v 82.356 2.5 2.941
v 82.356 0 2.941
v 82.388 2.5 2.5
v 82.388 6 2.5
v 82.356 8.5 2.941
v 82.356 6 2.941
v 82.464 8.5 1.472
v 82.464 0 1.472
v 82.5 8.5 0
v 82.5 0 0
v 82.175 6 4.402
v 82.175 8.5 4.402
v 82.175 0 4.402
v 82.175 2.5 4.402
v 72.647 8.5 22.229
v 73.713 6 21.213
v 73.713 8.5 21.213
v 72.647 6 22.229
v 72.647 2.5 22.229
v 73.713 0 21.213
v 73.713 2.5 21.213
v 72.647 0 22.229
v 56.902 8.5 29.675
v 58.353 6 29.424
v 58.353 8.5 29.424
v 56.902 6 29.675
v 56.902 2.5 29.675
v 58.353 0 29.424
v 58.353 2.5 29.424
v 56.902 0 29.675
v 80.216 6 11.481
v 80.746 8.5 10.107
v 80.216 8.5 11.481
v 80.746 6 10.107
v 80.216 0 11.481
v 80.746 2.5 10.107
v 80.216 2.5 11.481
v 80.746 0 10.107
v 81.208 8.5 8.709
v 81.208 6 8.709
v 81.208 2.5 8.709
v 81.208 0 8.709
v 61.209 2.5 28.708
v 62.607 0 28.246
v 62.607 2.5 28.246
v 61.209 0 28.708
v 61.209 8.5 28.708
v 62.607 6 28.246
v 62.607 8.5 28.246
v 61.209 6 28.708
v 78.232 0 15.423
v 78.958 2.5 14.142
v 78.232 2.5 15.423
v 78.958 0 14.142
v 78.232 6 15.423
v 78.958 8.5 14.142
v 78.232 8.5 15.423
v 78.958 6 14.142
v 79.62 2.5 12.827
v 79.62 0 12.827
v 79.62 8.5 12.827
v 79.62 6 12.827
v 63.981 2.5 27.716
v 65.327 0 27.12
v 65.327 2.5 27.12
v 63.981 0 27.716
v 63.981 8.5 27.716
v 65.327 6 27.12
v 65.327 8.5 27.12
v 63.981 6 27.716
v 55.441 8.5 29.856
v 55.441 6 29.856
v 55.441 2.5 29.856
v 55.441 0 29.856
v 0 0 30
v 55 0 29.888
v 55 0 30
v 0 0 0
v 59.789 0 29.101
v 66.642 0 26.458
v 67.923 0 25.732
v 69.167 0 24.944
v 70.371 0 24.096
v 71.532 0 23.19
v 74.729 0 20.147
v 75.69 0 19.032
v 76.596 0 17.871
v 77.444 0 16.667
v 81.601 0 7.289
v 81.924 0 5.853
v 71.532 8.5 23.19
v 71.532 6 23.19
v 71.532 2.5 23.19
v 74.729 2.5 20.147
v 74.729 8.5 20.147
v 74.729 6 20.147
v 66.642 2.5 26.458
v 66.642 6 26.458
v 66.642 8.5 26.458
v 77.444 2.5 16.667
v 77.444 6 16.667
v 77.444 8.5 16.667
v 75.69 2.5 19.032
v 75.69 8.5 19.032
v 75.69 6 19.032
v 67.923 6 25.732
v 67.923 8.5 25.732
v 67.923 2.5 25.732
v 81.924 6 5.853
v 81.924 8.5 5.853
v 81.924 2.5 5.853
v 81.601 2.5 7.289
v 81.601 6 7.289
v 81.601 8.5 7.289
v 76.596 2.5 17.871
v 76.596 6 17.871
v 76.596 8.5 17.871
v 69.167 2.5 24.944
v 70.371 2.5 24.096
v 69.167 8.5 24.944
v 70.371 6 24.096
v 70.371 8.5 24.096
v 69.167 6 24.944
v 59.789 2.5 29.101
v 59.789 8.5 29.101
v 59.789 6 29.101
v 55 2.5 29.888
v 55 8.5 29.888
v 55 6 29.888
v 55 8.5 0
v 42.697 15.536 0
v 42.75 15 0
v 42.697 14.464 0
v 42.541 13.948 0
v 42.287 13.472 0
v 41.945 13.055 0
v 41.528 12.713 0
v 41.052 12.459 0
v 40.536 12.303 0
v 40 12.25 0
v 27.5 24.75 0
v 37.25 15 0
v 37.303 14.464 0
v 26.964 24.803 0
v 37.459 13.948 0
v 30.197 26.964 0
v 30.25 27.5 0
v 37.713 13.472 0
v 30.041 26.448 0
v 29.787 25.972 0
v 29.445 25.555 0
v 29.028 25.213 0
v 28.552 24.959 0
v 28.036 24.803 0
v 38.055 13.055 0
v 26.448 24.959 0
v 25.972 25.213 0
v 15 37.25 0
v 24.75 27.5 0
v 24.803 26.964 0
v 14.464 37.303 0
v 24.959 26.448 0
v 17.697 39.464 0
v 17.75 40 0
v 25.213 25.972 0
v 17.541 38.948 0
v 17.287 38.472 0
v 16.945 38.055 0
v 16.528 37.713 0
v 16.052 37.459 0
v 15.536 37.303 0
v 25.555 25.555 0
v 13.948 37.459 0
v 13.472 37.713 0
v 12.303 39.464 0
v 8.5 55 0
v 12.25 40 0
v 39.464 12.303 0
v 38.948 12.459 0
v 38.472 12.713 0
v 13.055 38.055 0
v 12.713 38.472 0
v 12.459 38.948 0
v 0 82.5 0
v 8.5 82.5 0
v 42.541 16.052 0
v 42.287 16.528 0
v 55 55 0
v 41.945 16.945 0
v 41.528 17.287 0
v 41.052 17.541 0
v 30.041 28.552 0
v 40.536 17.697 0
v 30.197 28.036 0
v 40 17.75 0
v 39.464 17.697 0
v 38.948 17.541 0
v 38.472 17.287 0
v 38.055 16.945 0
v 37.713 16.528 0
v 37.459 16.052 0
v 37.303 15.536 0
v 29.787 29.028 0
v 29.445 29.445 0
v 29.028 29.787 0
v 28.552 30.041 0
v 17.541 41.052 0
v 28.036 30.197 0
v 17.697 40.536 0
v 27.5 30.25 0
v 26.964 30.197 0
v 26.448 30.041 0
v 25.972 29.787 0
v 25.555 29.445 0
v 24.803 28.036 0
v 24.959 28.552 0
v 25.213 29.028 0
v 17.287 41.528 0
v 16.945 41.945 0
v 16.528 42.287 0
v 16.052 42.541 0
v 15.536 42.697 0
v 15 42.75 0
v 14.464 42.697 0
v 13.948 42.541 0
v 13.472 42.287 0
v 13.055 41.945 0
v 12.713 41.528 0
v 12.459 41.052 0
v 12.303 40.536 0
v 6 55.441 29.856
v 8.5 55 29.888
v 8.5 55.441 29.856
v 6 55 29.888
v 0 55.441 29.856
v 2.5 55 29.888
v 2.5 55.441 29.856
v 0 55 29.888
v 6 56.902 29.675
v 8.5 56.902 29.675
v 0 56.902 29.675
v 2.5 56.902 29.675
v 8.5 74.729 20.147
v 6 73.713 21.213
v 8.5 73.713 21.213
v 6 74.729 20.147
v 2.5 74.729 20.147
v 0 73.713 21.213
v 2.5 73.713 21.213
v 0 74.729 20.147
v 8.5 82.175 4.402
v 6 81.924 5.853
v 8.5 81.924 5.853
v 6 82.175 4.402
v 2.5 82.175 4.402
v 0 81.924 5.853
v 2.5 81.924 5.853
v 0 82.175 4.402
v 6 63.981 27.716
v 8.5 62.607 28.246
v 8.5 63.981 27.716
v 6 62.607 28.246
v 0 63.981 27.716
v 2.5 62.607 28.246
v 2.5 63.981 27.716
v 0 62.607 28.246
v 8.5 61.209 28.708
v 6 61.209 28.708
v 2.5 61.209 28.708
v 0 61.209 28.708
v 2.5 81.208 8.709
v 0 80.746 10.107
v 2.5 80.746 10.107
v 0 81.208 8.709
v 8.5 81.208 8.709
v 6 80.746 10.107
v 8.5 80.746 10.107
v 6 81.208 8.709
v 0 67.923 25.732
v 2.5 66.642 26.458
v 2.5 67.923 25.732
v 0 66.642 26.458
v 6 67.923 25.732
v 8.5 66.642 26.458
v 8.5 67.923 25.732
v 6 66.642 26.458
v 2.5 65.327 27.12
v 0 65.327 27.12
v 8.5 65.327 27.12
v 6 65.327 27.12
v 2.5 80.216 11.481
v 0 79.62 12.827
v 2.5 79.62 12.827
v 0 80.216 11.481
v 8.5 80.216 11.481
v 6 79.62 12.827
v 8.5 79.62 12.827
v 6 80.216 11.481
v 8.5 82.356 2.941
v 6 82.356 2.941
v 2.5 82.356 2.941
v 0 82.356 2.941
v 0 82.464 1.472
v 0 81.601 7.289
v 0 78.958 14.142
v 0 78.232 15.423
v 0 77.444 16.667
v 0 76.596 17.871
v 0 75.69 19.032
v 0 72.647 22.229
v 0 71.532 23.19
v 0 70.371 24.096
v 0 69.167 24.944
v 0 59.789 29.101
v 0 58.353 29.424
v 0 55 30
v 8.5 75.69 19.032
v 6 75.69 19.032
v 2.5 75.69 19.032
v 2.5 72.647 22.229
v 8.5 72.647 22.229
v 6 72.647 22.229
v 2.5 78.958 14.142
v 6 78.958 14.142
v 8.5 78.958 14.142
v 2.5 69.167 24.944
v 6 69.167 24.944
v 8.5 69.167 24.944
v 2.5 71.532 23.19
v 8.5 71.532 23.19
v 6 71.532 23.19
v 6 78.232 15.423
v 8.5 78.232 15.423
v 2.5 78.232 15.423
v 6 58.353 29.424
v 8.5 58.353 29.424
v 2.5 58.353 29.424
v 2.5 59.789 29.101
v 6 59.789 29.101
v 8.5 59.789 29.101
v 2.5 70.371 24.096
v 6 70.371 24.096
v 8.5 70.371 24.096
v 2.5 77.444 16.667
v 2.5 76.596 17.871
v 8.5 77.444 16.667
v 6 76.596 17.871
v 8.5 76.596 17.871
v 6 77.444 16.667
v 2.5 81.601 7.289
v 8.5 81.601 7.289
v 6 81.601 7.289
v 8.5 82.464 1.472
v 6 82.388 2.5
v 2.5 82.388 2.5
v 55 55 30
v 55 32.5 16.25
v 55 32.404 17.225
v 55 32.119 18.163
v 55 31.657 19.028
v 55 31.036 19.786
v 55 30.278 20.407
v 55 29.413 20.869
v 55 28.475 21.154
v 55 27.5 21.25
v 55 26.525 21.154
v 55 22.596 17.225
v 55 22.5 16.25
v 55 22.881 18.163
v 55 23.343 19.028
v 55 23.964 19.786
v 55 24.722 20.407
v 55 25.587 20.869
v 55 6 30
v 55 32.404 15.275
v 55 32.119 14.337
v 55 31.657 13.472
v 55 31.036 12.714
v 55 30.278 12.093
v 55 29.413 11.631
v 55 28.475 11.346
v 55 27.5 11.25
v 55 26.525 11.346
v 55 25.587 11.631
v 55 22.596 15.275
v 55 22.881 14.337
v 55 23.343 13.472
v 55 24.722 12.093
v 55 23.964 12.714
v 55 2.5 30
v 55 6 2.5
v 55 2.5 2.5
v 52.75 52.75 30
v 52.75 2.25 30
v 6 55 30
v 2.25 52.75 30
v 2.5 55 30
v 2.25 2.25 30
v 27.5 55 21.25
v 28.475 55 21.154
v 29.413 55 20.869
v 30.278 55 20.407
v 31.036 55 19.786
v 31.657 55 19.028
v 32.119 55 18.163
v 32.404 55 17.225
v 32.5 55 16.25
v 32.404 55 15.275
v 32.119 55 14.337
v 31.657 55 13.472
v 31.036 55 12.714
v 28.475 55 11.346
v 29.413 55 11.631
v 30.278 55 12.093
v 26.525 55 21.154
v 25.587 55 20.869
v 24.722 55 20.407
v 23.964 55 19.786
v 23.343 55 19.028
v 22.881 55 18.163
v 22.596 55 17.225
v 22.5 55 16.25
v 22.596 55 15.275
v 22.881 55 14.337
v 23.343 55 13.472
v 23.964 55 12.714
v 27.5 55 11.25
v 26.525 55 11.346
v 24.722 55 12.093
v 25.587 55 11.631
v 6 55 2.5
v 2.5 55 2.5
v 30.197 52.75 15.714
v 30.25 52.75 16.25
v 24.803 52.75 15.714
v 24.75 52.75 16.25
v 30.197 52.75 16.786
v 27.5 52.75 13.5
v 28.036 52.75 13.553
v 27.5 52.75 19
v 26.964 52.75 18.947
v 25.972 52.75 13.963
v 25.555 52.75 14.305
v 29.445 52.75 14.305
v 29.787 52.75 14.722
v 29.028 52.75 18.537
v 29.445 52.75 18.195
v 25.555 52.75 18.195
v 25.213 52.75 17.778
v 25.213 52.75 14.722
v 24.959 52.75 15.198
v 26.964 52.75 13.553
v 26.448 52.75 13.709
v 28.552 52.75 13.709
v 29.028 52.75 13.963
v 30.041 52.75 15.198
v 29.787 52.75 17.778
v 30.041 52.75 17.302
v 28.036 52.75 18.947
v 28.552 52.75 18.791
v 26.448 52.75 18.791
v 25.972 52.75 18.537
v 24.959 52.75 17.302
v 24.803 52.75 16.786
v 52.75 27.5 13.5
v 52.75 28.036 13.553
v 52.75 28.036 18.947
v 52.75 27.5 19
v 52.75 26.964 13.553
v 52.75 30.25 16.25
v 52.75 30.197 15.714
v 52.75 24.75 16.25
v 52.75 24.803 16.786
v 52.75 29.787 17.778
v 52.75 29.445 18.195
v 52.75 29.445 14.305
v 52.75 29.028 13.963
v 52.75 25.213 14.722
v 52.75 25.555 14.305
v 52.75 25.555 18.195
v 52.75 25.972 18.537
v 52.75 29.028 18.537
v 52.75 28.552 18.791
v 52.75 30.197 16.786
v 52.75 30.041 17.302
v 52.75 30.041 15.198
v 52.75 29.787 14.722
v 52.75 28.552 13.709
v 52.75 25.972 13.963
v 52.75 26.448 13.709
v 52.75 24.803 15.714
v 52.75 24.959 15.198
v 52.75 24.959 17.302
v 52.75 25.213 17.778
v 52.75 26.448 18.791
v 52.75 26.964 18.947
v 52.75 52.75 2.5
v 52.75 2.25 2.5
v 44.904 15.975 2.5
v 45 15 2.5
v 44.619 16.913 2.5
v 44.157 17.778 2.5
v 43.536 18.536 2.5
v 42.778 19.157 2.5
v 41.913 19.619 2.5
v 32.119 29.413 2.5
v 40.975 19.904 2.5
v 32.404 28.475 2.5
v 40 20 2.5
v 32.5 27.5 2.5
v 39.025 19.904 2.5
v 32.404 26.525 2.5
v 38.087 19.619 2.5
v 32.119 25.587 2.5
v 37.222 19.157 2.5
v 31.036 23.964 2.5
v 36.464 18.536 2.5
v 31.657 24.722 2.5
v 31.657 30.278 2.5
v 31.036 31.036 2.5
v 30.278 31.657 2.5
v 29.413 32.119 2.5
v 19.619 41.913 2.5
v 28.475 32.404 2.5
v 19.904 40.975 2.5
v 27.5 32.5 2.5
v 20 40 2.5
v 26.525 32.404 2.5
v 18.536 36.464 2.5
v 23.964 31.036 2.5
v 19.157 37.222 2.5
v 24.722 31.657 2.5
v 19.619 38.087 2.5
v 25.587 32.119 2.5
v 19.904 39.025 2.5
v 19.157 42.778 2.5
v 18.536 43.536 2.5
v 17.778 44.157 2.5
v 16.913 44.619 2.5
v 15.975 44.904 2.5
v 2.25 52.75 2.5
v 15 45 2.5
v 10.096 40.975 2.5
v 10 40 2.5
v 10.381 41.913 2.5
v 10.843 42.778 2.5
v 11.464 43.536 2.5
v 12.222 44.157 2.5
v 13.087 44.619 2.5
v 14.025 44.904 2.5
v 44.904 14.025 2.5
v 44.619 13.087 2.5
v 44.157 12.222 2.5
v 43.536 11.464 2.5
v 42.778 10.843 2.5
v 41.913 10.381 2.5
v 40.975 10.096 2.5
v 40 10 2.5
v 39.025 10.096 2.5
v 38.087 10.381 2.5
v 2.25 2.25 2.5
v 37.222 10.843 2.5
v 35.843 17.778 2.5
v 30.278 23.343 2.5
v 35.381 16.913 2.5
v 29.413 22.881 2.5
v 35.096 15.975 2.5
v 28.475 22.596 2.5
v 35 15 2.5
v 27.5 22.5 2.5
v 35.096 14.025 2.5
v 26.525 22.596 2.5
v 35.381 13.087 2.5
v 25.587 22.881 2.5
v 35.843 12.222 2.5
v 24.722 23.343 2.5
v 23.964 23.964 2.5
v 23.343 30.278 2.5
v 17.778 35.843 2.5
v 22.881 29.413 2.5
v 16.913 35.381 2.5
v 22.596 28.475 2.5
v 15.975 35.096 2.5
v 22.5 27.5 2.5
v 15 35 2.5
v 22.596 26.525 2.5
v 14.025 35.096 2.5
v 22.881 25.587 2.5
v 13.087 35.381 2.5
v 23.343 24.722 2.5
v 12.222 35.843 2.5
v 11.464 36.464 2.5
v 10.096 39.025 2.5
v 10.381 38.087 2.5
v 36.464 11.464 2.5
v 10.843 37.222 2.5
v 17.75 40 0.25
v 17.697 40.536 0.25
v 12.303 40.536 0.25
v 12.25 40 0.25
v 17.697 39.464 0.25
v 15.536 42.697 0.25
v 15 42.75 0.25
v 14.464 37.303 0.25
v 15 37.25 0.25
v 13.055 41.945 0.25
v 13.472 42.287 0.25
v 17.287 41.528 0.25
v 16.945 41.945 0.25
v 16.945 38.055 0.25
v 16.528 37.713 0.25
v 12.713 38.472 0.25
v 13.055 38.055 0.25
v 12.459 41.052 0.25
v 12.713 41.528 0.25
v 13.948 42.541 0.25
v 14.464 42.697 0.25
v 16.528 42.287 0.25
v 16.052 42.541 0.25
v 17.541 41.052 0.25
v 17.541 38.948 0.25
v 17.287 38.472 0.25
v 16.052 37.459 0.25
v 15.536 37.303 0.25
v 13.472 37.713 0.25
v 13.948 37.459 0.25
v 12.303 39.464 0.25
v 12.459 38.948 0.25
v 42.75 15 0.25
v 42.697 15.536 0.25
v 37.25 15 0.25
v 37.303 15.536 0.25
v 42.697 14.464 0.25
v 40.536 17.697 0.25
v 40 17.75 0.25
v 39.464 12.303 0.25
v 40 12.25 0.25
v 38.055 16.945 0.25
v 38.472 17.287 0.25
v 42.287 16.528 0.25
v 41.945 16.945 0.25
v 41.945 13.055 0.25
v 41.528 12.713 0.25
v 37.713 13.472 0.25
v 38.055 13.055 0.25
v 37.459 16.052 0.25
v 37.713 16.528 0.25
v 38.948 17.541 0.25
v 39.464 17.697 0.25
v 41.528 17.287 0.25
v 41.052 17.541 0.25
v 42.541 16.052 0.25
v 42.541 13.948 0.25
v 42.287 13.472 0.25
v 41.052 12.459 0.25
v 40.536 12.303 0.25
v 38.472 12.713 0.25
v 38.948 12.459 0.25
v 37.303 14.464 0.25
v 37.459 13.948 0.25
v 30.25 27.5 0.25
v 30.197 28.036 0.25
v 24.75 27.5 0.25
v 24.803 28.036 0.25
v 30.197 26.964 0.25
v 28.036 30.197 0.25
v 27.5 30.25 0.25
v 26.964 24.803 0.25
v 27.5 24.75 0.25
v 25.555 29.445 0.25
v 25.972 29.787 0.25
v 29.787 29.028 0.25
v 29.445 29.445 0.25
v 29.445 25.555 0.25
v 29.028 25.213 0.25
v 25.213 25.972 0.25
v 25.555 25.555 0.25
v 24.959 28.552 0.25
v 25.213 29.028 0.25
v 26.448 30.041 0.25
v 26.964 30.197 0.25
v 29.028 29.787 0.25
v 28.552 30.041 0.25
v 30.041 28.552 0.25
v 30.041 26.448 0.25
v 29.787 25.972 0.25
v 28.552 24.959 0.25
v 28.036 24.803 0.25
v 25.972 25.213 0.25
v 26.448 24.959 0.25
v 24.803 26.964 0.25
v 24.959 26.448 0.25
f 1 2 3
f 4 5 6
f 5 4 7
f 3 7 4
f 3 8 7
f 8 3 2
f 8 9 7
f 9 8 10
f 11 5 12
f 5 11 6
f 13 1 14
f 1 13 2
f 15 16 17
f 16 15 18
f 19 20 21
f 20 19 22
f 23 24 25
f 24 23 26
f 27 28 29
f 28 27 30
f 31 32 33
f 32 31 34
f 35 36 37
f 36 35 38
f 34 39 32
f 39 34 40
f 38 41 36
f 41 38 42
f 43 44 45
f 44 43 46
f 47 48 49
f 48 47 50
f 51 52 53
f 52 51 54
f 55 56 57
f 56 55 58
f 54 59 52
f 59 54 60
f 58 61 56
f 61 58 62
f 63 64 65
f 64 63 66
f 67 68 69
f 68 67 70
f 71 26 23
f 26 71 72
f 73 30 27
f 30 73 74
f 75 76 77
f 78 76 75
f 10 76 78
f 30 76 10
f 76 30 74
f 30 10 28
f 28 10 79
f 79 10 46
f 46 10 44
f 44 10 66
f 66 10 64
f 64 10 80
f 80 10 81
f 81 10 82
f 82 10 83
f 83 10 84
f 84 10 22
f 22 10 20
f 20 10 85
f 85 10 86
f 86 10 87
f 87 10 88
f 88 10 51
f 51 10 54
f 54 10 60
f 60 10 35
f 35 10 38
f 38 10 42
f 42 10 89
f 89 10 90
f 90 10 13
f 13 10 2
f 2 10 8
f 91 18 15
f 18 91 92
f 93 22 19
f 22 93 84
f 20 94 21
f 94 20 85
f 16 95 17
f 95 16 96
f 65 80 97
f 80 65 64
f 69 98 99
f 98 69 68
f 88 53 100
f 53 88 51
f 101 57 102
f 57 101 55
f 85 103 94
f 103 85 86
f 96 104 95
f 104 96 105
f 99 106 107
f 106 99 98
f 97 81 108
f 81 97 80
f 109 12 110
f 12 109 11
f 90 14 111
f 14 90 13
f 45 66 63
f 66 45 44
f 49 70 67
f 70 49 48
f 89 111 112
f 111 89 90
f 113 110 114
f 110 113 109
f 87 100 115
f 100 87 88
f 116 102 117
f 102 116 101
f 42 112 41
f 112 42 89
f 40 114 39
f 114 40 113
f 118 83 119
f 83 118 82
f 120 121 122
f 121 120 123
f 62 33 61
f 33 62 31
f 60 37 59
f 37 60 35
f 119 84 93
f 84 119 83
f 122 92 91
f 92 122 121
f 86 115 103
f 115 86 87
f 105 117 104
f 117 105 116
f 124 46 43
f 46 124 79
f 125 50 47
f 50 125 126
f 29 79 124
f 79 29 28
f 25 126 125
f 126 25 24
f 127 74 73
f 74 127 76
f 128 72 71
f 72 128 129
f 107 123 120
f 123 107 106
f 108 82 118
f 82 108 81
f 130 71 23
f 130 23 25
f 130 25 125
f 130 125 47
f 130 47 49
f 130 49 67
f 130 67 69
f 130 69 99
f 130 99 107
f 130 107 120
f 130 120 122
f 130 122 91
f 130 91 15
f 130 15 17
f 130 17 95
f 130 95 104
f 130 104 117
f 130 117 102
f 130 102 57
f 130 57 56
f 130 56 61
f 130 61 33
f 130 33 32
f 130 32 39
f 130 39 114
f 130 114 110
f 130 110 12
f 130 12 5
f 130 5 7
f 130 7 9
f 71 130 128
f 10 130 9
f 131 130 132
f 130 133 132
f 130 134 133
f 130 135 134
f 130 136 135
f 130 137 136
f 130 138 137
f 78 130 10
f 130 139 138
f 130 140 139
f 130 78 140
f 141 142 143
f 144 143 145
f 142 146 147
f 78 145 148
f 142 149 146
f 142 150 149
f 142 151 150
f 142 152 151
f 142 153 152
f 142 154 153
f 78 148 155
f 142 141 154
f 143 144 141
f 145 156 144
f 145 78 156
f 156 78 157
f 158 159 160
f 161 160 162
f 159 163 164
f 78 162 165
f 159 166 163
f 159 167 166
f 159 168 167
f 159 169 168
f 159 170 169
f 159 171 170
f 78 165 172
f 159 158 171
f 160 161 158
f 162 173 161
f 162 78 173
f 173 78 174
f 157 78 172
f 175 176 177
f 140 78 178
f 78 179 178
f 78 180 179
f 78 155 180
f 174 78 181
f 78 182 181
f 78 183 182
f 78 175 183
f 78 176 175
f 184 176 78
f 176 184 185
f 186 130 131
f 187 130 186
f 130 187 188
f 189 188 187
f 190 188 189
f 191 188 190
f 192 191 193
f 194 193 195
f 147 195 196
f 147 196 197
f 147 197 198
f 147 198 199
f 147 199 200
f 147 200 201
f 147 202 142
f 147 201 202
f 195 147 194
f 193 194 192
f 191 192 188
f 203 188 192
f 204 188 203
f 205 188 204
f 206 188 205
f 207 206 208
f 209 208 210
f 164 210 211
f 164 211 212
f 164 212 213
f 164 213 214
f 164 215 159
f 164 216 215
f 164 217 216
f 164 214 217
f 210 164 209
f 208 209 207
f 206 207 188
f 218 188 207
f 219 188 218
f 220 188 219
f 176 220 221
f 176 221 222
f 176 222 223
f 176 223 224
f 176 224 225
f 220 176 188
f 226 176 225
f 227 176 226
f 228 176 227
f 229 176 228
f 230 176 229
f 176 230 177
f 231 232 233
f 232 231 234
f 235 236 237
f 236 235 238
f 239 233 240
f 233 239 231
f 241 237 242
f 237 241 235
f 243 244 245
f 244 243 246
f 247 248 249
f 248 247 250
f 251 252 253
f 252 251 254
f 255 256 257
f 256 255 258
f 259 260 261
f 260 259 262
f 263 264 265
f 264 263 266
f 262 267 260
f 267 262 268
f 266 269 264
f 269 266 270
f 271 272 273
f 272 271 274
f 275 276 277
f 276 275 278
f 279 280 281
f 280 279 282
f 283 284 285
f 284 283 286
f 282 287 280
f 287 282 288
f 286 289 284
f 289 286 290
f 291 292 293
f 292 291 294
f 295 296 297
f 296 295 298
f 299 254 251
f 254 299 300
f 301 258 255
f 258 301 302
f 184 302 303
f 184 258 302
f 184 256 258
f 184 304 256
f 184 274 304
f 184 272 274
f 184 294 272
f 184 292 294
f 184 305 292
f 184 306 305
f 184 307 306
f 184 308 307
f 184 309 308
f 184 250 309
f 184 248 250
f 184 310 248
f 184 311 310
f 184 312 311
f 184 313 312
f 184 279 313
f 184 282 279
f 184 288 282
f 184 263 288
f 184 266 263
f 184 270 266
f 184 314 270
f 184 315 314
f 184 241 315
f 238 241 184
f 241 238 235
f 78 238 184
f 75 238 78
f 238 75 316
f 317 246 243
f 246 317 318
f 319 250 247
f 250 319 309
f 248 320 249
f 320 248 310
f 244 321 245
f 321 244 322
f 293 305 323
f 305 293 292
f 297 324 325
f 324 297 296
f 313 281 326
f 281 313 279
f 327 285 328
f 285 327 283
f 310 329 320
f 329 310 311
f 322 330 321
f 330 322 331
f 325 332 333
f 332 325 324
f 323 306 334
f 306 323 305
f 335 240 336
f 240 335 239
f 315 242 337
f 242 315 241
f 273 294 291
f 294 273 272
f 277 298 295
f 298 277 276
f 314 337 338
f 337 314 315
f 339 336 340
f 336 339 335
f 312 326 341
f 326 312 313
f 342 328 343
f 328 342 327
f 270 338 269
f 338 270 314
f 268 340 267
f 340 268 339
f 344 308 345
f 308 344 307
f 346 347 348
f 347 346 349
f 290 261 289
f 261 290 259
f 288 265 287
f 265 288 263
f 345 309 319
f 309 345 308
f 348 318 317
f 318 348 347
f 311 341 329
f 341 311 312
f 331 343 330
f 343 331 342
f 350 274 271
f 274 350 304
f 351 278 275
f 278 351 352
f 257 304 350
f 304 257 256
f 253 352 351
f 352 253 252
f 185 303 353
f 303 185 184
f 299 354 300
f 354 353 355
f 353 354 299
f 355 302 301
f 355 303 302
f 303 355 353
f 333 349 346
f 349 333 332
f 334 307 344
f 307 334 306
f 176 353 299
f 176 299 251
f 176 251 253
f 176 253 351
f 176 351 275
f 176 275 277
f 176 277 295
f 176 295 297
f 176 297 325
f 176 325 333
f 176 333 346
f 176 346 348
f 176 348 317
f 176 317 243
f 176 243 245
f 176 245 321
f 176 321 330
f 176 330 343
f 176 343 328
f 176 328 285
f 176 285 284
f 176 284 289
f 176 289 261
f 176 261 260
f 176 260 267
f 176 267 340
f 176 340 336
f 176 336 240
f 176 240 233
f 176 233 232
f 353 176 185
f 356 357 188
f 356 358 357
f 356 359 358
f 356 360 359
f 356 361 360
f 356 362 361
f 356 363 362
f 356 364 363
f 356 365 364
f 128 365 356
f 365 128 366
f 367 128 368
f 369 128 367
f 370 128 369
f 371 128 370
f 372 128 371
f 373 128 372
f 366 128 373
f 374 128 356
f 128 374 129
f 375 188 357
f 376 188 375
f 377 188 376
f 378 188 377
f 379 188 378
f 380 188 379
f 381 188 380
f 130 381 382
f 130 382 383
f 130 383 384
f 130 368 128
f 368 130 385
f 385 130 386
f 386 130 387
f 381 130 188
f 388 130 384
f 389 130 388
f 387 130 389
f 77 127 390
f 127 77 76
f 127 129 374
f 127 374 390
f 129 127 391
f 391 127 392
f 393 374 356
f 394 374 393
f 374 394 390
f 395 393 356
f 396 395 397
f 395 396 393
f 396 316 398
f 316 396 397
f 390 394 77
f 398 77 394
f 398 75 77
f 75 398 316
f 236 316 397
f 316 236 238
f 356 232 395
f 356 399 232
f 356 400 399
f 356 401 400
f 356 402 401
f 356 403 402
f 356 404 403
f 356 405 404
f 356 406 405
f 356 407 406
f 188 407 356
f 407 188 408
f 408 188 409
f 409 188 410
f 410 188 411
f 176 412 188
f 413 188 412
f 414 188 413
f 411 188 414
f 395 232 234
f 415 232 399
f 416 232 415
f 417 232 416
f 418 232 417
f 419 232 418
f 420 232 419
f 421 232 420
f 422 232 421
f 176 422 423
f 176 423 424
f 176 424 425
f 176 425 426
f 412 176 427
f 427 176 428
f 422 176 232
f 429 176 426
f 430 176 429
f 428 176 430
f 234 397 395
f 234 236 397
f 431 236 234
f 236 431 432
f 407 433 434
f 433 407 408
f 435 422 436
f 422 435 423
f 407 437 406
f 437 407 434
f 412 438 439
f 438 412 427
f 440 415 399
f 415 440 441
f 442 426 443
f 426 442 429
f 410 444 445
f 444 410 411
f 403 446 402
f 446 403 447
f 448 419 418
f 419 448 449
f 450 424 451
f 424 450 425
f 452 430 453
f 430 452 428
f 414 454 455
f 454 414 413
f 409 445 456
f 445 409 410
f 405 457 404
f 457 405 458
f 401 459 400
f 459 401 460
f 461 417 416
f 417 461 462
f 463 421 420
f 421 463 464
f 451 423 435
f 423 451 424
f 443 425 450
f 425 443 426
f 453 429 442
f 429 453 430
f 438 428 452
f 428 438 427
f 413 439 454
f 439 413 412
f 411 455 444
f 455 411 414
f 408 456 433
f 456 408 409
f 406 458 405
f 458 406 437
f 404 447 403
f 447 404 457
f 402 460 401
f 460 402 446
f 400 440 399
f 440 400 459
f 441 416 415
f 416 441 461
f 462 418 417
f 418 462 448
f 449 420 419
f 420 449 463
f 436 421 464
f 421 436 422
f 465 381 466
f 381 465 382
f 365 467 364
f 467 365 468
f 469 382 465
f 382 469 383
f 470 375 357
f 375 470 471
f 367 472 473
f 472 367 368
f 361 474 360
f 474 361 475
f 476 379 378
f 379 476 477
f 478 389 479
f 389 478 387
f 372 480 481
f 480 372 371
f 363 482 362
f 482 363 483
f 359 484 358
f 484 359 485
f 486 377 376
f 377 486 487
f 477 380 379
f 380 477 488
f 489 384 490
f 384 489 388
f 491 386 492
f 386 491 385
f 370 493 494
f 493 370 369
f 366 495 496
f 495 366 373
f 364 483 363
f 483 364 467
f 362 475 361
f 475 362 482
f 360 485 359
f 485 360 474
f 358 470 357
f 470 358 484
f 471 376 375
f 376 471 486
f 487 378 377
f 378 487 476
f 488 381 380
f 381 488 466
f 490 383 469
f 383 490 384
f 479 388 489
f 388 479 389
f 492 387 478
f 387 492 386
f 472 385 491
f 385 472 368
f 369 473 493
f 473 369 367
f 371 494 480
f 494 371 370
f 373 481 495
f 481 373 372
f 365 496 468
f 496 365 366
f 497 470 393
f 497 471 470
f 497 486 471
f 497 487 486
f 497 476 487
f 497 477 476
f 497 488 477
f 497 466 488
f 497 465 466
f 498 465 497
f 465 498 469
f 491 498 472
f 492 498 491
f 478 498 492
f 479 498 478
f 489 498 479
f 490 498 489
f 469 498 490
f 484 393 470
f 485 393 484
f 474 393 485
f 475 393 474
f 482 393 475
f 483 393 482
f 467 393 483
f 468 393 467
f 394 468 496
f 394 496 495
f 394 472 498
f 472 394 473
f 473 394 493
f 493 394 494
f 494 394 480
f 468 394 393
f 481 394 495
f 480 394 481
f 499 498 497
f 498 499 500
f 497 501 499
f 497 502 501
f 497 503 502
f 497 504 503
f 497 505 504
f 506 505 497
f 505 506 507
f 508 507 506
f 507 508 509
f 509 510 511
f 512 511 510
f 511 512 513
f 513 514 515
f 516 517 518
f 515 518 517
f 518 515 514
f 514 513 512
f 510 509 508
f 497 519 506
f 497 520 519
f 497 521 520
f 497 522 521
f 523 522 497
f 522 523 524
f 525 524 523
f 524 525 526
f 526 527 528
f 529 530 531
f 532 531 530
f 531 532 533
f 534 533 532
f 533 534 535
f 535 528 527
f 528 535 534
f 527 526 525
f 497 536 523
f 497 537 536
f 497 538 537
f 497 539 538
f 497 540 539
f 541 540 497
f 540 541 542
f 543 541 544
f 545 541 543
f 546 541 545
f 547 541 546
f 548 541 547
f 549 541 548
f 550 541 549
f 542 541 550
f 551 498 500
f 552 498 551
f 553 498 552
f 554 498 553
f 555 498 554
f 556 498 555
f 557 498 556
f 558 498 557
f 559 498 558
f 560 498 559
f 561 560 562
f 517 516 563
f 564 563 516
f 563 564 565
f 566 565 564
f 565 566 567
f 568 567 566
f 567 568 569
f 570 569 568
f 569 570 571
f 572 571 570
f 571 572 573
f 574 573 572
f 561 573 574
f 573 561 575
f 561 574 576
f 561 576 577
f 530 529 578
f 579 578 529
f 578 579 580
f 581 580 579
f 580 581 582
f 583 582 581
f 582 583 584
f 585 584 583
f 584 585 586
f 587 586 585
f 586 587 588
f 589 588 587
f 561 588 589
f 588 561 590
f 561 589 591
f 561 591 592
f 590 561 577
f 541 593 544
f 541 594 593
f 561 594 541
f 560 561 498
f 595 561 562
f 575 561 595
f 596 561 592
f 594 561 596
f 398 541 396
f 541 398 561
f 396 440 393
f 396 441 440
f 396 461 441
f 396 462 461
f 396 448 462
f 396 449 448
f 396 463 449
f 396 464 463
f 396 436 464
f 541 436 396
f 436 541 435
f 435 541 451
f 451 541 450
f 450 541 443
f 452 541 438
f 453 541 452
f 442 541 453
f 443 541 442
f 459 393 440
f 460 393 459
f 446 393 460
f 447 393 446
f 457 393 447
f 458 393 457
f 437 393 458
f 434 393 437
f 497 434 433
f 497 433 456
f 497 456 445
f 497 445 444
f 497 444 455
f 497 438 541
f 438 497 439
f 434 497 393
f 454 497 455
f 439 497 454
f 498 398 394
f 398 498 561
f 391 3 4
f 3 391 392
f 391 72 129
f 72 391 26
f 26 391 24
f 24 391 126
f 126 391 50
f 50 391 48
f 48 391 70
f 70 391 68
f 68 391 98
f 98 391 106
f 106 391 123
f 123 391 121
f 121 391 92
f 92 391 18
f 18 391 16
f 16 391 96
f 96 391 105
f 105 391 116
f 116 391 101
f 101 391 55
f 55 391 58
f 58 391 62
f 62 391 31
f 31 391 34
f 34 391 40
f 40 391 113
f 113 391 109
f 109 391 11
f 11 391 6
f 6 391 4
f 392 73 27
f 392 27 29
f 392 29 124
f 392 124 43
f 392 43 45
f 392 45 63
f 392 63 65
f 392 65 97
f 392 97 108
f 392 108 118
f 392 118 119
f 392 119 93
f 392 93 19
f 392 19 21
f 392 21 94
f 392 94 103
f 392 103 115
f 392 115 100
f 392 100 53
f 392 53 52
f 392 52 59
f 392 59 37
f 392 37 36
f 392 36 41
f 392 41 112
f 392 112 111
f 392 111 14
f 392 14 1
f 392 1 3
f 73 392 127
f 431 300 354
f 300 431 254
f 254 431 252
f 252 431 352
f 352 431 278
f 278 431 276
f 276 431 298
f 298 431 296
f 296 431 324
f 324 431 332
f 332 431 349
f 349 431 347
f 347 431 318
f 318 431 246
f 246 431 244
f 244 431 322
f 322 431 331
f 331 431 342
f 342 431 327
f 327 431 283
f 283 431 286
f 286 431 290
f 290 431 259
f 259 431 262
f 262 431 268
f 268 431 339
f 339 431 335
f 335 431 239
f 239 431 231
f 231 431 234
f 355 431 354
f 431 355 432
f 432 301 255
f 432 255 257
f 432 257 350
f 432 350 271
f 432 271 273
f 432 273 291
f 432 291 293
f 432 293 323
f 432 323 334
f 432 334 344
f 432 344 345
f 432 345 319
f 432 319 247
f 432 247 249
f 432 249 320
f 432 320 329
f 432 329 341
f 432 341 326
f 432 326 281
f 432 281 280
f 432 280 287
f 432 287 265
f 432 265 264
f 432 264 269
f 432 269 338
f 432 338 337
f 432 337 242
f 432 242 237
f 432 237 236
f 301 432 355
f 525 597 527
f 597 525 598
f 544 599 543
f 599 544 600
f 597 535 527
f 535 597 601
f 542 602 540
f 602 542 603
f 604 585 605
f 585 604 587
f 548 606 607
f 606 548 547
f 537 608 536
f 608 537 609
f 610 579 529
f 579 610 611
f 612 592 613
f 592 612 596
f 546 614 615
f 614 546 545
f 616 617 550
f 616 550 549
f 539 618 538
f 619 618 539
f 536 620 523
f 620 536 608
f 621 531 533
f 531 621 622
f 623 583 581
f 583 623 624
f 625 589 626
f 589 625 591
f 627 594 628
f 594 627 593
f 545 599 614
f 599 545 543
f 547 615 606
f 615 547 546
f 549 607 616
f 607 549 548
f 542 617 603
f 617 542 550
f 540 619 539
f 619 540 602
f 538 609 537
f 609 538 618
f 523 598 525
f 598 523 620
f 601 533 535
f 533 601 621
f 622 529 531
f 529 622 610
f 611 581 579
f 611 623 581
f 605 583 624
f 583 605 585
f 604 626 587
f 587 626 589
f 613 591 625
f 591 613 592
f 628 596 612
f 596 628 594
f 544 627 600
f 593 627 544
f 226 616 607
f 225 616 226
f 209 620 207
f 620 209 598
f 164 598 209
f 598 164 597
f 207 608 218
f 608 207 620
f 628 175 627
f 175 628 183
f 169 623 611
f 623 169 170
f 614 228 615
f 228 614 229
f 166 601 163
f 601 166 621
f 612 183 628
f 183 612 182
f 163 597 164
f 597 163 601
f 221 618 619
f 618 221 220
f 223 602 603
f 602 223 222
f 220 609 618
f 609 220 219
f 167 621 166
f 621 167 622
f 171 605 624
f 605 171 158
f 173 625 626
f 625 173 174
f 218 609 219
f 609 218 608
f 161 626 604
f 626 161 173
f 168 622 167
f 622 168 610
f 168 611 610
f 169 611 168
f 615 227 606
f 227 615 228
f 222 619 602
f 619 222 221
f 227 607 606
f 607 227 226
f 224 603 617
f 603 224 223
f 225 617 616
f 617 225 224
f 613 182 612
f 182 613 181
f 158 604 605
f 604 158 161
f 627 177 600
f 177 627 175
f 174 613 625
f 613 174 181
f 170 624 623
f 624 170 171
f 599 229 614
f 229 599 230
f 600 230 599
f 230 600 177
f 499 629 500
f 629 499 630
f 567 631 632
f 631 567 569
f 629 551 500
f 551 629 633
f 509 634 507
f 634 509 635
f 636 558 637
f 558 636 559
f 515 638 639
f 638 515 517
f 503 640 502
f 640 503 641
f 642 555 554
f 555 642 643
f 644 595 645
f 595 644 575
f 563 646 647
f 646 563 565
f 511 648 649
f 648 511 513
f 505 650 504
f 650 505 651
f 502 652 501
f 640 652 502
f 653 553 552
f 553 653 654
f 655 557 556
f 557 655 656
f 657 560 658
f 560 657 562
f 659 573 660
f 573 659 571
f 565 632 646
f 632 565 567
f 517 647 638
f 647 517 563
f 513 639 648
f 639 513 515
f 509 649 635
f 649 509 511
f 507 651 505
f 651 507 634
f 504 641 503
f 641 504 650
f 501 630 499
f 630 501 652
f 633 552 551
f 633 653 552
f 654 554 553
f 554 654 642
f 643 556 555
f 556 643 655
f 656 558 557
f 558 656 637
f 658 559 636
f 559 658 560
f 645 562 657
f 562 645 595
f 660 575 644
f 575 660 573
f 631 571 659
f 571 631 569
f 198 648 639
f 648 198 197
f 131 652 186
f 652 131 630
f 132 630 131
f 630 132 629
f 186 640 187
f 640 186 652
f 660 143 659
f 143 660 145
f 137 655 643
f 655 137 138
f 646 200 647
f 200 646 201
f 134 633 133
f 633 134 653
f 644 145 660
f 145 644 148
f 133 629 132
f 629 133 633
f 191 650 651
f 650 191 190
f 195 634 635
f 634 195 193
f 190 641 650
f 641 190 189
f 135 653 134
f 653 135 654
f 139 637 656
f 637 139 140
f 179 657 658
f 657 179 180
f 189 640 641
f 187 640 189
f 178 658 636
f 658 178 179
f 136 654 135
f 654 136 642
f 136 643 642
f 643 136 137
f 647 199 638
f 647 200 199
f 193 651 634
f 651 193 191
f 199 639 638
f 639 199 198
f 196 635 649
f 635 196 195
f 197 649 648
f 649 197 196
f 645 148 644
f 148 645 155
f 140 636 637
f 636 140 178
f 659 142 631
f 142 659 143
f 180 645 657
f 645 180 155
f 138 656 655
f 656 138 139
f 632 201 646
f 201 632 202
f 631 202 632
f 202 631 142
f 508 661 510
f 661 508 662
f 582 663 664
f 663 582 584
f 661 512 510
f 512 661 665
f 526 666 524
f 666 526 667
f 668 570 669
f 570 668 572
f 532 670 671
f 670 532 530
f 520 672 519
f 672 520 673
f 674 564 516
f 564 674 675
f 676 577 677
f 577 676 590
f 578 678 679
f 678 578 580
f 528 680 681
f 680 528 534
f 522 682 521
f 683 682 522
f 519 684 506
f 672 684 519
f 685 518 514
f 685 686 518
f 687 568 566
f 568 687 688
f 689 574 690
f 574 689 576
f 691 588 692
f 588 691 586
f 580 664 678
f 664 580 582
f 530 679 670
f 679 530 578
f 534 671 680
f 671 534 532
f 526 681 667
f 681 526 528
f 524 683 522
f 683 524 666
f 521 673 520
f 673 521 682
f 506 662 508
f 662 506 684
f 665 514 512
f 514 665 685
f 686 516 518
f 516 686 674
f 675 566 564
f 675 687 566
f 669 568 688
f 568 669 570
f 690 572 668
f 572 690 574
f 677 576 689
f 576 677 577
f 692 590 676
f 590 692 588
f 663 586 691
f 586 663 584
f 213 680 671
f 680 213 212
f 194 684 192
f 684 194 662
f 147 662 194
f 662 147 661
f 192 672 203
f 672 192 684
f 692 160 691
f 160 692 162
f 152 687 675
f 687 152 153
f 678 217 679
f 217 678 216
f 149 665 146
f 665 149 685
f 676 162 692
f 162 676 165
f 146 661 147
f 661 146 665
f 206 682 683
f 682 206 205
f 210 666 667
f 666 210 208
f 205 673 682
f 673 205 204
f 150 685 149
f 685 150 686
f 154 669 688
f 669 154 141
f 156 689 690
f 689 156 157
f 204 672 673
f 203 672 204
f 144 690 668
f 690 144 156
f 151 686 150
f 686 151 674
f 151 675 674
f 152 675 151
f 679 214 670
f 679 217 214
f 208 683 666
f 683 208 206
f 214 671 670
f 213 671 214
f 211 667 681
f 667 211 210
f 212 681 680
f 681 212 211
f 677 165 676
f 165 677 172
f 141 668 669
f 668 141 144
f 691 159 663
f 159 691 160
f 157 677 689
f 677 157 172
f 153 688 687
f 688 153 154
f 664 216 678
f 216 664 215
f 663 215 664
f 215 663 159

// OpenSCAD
// file: shared.scad
// M5 CSK fitting 90deg bevel
// h - length of the drill bore including csk
// csk - diameter of the csk
// recess - recess of the csk, added above the csk
module m5csk(h=2.5, csk=10, recess=0) {
    m5bore(h=h);
    intersection() {
        translate([0, 0, -(csk/2 - h)]) cylinder(d2=csk, d1=0, h=(csk/2), $fn=32);
        cylinder(d=csk, h=h, $fn=32);
    }
    translate([0, 0, h]) cylinder(h=recess, d=csk);
}

// M5 clearance bore
// h - length of the bore
module m5bore(h=2.5) {
    cylinder(d=5.5, h=h, $fn=32);
}

module quarter_cylinder(r, h) {
    $fn=128;
    intersection() {
        cylinder(r=r, h=h);
        translate([0, 0, -0.05]) cube([r, r, h+0.1]);
    }
}

module ccube(size, center=false) {
    if(center){
        translate(-(size/2)) cube(size);
    } else {
        translate([-size.x/2, -size.y/2, 0]) cube(size);
    }
}
// file: centre_feet.scad
use <shared.scad>;

module base_centre(pillar=0){ 
    difference() {
        union() {
            translate([-55, 0, 0]) cube([110, 55, 30+pillar]);
            translate([52.75, 8.5, 0]) rotate([90, 0, 0]) quarter_cylinder(30, 8.5);
            translate([-52.75, 8.5, 0]) rotate([90, -90, 0]) quarter_cylinder(30, 8.5); 
            translate([7, 52.5, 0]) rotate([0, -90, 0]) quarter_cylinder(30, 14);
        }
        translate([2.25, 2.25, 2.5+pillar]) cube([50.5, 50.5, 27.5]);
        translate([-52.75, 2.25, 2.5+pillar]) cube([50.5, 50.5, 27.5]);
        translate([55, 2.5, 2.5]) cube([27.5, 3.5, 27.5]);
        translate([-55-27.5, 2.5, 2.5]) cube([27.5, 3.5, 27.5]);
        translate([-4.75, 55, 2.5]) cube([9.5, 27.5, 27.5]);
        translate([0, 0, 16.25+pillar]) {
            translate([27.5, 52.5, 0]) rotate([-90, 0, 0]) m5csk();
            translate([52.5, 27.5, 0]) rotate([0, 90, 0]) m5csk();
            translate([-27.5, 52.5, 0]) rotate([-90, 0, 0]) m5csk();
            translate([-52.5, 27.5, 0]) rotate([0, -90, 0]) m5csk();
        }
    }
}

module centre_foot(){ 
    difference() {
        base_centre();
        translate([15, 40, 0]) m5csk();
        translate([40, 15, 0]) m5csk();
        translate([27.5, 27.5, 0]) m5csk();
        translate([-15, 40, 0]) m5csk();
        translate([-40, 15, 0]) m5csk();
        translate([-27.5, 27.5, 0]) m5csk();
    }
}

module centre_lower_top(){ 
    difference() {
        rotate([0, 180, 0]) base_centre();
        translate([15, 40, -2.5]) m5csk();
        translate([40, 15, -2.5]) m5csk();
        translate([27.5, 27.5, 0]) rotate([180, 0, 0]) m5bore();
        translate([-15, 40, -2.5])  m5csk();
        translate([-40, 15, -2.5]) m5csk();
        translate([-27.5, 27.5, 0]) rotate([180, 0, 0]) m5bore();
    }
}

module centre_upper_top(){ 
    difference() {
        rotate([0, 180, 0]) base_centre(pillar=100);
        translate([15, 40, -102.5]) m5csk(recess=100);
        translate([40, 15, -102.5]) m5csk(recess=100);
        translate([27.5, 27.5, 0]) rotate([180, 0, 0]) m5bore(h=105);
        translate([-15, 40, -102.5]) m5csk(recess=100);
        translate([-40, 15, -102.5]) m5csk(recess=100);
        translate([-27.5, 27.5, 0]) rotate([180, 0, 0]) m5bore(h=105);
    }
}

centre_foot();
// file: outer_feet.scad
use <shared.scad>;

module base_outer(pillar=0) {
    difference() {
        union() {
            cube([55, 55, 30+pillar]);
            translate([52.5, 8.5, 0])
                rotate([90, 0, 0])
                quarter_cylinder(30, 8.5); 
            translate([8.5, 52.5, 0])
                rotate([0, -90, 0])
                quarter_cylinder(30, 8.5); 
        }
        translate([2.25, 2.25, 2.5+pillar]) cube([50.5, 50.5, 27.5]);
        translate([55, 2.5, 2.5]) cube([27.5, 3.5, 27.5]);
        translate([2.5, 55, 2.5]) cube([3.5, 27.5, 27.5]);
        translate([0, 0, 16.25+pillar]) {
            translate([27.5, 52.5, 0]) rotate([-90, 0, 0]) m5csk();
            translate([52.5, 27.5, 0]) rotate([0, 90, 0]) m5csk();
        }
    }
}

module outer_foot(){ 
    difference() {
        base_outer();
        translate([15, 40, 0]) m5csk();
        translate([40, 15, 0]) m5csk();
        translate([27.5, 27.5, 0]) m5csk();
    }
}

module outer_lower_top(){ 
    difference() {
        rotate([180, 0, 90]) base_outer();
        translate([15, 40, -2.5]) m5csk();
        translate([40, 15, -2.5]) m5csk();
        translate([27.5, 27.5, 0]) rotate([180, 0, 0]) m5bore();
    }
}

module outer_upper_top(){ 
    difference(){
        rotate([180, 0, 90]) base_outer(pillar=100);
        translate([15, 40, -102.5]) m5csk(recess=100);
        translate([40, 15, -102.5]) m5csk(recess=100);
        translate([27.5, 27.5, 0]) rotate([180, 0, 0]) m5bore(h=105);
    }
}

outer_foot();
// main file
use <./outer_feet.scad>;
use <./centre_feet.scad>;

RENDER="outer_foot";
if(RENDER=="outer_foot"){
    outer_foot();
} else if(RENDER=="outer_lower_top"){
    outer_lower_top();
} else if(RENDER=="outer_upper_top"){
    outer_upper_top();
} else if(RENDER=="centre_foot"){
    centre_foot();
} else if(RENDER=="centre_lower_top"){
    centre_lower_top();
} else if(RENDER=="centre_upper_top"){
    centre_upper_top();
}
